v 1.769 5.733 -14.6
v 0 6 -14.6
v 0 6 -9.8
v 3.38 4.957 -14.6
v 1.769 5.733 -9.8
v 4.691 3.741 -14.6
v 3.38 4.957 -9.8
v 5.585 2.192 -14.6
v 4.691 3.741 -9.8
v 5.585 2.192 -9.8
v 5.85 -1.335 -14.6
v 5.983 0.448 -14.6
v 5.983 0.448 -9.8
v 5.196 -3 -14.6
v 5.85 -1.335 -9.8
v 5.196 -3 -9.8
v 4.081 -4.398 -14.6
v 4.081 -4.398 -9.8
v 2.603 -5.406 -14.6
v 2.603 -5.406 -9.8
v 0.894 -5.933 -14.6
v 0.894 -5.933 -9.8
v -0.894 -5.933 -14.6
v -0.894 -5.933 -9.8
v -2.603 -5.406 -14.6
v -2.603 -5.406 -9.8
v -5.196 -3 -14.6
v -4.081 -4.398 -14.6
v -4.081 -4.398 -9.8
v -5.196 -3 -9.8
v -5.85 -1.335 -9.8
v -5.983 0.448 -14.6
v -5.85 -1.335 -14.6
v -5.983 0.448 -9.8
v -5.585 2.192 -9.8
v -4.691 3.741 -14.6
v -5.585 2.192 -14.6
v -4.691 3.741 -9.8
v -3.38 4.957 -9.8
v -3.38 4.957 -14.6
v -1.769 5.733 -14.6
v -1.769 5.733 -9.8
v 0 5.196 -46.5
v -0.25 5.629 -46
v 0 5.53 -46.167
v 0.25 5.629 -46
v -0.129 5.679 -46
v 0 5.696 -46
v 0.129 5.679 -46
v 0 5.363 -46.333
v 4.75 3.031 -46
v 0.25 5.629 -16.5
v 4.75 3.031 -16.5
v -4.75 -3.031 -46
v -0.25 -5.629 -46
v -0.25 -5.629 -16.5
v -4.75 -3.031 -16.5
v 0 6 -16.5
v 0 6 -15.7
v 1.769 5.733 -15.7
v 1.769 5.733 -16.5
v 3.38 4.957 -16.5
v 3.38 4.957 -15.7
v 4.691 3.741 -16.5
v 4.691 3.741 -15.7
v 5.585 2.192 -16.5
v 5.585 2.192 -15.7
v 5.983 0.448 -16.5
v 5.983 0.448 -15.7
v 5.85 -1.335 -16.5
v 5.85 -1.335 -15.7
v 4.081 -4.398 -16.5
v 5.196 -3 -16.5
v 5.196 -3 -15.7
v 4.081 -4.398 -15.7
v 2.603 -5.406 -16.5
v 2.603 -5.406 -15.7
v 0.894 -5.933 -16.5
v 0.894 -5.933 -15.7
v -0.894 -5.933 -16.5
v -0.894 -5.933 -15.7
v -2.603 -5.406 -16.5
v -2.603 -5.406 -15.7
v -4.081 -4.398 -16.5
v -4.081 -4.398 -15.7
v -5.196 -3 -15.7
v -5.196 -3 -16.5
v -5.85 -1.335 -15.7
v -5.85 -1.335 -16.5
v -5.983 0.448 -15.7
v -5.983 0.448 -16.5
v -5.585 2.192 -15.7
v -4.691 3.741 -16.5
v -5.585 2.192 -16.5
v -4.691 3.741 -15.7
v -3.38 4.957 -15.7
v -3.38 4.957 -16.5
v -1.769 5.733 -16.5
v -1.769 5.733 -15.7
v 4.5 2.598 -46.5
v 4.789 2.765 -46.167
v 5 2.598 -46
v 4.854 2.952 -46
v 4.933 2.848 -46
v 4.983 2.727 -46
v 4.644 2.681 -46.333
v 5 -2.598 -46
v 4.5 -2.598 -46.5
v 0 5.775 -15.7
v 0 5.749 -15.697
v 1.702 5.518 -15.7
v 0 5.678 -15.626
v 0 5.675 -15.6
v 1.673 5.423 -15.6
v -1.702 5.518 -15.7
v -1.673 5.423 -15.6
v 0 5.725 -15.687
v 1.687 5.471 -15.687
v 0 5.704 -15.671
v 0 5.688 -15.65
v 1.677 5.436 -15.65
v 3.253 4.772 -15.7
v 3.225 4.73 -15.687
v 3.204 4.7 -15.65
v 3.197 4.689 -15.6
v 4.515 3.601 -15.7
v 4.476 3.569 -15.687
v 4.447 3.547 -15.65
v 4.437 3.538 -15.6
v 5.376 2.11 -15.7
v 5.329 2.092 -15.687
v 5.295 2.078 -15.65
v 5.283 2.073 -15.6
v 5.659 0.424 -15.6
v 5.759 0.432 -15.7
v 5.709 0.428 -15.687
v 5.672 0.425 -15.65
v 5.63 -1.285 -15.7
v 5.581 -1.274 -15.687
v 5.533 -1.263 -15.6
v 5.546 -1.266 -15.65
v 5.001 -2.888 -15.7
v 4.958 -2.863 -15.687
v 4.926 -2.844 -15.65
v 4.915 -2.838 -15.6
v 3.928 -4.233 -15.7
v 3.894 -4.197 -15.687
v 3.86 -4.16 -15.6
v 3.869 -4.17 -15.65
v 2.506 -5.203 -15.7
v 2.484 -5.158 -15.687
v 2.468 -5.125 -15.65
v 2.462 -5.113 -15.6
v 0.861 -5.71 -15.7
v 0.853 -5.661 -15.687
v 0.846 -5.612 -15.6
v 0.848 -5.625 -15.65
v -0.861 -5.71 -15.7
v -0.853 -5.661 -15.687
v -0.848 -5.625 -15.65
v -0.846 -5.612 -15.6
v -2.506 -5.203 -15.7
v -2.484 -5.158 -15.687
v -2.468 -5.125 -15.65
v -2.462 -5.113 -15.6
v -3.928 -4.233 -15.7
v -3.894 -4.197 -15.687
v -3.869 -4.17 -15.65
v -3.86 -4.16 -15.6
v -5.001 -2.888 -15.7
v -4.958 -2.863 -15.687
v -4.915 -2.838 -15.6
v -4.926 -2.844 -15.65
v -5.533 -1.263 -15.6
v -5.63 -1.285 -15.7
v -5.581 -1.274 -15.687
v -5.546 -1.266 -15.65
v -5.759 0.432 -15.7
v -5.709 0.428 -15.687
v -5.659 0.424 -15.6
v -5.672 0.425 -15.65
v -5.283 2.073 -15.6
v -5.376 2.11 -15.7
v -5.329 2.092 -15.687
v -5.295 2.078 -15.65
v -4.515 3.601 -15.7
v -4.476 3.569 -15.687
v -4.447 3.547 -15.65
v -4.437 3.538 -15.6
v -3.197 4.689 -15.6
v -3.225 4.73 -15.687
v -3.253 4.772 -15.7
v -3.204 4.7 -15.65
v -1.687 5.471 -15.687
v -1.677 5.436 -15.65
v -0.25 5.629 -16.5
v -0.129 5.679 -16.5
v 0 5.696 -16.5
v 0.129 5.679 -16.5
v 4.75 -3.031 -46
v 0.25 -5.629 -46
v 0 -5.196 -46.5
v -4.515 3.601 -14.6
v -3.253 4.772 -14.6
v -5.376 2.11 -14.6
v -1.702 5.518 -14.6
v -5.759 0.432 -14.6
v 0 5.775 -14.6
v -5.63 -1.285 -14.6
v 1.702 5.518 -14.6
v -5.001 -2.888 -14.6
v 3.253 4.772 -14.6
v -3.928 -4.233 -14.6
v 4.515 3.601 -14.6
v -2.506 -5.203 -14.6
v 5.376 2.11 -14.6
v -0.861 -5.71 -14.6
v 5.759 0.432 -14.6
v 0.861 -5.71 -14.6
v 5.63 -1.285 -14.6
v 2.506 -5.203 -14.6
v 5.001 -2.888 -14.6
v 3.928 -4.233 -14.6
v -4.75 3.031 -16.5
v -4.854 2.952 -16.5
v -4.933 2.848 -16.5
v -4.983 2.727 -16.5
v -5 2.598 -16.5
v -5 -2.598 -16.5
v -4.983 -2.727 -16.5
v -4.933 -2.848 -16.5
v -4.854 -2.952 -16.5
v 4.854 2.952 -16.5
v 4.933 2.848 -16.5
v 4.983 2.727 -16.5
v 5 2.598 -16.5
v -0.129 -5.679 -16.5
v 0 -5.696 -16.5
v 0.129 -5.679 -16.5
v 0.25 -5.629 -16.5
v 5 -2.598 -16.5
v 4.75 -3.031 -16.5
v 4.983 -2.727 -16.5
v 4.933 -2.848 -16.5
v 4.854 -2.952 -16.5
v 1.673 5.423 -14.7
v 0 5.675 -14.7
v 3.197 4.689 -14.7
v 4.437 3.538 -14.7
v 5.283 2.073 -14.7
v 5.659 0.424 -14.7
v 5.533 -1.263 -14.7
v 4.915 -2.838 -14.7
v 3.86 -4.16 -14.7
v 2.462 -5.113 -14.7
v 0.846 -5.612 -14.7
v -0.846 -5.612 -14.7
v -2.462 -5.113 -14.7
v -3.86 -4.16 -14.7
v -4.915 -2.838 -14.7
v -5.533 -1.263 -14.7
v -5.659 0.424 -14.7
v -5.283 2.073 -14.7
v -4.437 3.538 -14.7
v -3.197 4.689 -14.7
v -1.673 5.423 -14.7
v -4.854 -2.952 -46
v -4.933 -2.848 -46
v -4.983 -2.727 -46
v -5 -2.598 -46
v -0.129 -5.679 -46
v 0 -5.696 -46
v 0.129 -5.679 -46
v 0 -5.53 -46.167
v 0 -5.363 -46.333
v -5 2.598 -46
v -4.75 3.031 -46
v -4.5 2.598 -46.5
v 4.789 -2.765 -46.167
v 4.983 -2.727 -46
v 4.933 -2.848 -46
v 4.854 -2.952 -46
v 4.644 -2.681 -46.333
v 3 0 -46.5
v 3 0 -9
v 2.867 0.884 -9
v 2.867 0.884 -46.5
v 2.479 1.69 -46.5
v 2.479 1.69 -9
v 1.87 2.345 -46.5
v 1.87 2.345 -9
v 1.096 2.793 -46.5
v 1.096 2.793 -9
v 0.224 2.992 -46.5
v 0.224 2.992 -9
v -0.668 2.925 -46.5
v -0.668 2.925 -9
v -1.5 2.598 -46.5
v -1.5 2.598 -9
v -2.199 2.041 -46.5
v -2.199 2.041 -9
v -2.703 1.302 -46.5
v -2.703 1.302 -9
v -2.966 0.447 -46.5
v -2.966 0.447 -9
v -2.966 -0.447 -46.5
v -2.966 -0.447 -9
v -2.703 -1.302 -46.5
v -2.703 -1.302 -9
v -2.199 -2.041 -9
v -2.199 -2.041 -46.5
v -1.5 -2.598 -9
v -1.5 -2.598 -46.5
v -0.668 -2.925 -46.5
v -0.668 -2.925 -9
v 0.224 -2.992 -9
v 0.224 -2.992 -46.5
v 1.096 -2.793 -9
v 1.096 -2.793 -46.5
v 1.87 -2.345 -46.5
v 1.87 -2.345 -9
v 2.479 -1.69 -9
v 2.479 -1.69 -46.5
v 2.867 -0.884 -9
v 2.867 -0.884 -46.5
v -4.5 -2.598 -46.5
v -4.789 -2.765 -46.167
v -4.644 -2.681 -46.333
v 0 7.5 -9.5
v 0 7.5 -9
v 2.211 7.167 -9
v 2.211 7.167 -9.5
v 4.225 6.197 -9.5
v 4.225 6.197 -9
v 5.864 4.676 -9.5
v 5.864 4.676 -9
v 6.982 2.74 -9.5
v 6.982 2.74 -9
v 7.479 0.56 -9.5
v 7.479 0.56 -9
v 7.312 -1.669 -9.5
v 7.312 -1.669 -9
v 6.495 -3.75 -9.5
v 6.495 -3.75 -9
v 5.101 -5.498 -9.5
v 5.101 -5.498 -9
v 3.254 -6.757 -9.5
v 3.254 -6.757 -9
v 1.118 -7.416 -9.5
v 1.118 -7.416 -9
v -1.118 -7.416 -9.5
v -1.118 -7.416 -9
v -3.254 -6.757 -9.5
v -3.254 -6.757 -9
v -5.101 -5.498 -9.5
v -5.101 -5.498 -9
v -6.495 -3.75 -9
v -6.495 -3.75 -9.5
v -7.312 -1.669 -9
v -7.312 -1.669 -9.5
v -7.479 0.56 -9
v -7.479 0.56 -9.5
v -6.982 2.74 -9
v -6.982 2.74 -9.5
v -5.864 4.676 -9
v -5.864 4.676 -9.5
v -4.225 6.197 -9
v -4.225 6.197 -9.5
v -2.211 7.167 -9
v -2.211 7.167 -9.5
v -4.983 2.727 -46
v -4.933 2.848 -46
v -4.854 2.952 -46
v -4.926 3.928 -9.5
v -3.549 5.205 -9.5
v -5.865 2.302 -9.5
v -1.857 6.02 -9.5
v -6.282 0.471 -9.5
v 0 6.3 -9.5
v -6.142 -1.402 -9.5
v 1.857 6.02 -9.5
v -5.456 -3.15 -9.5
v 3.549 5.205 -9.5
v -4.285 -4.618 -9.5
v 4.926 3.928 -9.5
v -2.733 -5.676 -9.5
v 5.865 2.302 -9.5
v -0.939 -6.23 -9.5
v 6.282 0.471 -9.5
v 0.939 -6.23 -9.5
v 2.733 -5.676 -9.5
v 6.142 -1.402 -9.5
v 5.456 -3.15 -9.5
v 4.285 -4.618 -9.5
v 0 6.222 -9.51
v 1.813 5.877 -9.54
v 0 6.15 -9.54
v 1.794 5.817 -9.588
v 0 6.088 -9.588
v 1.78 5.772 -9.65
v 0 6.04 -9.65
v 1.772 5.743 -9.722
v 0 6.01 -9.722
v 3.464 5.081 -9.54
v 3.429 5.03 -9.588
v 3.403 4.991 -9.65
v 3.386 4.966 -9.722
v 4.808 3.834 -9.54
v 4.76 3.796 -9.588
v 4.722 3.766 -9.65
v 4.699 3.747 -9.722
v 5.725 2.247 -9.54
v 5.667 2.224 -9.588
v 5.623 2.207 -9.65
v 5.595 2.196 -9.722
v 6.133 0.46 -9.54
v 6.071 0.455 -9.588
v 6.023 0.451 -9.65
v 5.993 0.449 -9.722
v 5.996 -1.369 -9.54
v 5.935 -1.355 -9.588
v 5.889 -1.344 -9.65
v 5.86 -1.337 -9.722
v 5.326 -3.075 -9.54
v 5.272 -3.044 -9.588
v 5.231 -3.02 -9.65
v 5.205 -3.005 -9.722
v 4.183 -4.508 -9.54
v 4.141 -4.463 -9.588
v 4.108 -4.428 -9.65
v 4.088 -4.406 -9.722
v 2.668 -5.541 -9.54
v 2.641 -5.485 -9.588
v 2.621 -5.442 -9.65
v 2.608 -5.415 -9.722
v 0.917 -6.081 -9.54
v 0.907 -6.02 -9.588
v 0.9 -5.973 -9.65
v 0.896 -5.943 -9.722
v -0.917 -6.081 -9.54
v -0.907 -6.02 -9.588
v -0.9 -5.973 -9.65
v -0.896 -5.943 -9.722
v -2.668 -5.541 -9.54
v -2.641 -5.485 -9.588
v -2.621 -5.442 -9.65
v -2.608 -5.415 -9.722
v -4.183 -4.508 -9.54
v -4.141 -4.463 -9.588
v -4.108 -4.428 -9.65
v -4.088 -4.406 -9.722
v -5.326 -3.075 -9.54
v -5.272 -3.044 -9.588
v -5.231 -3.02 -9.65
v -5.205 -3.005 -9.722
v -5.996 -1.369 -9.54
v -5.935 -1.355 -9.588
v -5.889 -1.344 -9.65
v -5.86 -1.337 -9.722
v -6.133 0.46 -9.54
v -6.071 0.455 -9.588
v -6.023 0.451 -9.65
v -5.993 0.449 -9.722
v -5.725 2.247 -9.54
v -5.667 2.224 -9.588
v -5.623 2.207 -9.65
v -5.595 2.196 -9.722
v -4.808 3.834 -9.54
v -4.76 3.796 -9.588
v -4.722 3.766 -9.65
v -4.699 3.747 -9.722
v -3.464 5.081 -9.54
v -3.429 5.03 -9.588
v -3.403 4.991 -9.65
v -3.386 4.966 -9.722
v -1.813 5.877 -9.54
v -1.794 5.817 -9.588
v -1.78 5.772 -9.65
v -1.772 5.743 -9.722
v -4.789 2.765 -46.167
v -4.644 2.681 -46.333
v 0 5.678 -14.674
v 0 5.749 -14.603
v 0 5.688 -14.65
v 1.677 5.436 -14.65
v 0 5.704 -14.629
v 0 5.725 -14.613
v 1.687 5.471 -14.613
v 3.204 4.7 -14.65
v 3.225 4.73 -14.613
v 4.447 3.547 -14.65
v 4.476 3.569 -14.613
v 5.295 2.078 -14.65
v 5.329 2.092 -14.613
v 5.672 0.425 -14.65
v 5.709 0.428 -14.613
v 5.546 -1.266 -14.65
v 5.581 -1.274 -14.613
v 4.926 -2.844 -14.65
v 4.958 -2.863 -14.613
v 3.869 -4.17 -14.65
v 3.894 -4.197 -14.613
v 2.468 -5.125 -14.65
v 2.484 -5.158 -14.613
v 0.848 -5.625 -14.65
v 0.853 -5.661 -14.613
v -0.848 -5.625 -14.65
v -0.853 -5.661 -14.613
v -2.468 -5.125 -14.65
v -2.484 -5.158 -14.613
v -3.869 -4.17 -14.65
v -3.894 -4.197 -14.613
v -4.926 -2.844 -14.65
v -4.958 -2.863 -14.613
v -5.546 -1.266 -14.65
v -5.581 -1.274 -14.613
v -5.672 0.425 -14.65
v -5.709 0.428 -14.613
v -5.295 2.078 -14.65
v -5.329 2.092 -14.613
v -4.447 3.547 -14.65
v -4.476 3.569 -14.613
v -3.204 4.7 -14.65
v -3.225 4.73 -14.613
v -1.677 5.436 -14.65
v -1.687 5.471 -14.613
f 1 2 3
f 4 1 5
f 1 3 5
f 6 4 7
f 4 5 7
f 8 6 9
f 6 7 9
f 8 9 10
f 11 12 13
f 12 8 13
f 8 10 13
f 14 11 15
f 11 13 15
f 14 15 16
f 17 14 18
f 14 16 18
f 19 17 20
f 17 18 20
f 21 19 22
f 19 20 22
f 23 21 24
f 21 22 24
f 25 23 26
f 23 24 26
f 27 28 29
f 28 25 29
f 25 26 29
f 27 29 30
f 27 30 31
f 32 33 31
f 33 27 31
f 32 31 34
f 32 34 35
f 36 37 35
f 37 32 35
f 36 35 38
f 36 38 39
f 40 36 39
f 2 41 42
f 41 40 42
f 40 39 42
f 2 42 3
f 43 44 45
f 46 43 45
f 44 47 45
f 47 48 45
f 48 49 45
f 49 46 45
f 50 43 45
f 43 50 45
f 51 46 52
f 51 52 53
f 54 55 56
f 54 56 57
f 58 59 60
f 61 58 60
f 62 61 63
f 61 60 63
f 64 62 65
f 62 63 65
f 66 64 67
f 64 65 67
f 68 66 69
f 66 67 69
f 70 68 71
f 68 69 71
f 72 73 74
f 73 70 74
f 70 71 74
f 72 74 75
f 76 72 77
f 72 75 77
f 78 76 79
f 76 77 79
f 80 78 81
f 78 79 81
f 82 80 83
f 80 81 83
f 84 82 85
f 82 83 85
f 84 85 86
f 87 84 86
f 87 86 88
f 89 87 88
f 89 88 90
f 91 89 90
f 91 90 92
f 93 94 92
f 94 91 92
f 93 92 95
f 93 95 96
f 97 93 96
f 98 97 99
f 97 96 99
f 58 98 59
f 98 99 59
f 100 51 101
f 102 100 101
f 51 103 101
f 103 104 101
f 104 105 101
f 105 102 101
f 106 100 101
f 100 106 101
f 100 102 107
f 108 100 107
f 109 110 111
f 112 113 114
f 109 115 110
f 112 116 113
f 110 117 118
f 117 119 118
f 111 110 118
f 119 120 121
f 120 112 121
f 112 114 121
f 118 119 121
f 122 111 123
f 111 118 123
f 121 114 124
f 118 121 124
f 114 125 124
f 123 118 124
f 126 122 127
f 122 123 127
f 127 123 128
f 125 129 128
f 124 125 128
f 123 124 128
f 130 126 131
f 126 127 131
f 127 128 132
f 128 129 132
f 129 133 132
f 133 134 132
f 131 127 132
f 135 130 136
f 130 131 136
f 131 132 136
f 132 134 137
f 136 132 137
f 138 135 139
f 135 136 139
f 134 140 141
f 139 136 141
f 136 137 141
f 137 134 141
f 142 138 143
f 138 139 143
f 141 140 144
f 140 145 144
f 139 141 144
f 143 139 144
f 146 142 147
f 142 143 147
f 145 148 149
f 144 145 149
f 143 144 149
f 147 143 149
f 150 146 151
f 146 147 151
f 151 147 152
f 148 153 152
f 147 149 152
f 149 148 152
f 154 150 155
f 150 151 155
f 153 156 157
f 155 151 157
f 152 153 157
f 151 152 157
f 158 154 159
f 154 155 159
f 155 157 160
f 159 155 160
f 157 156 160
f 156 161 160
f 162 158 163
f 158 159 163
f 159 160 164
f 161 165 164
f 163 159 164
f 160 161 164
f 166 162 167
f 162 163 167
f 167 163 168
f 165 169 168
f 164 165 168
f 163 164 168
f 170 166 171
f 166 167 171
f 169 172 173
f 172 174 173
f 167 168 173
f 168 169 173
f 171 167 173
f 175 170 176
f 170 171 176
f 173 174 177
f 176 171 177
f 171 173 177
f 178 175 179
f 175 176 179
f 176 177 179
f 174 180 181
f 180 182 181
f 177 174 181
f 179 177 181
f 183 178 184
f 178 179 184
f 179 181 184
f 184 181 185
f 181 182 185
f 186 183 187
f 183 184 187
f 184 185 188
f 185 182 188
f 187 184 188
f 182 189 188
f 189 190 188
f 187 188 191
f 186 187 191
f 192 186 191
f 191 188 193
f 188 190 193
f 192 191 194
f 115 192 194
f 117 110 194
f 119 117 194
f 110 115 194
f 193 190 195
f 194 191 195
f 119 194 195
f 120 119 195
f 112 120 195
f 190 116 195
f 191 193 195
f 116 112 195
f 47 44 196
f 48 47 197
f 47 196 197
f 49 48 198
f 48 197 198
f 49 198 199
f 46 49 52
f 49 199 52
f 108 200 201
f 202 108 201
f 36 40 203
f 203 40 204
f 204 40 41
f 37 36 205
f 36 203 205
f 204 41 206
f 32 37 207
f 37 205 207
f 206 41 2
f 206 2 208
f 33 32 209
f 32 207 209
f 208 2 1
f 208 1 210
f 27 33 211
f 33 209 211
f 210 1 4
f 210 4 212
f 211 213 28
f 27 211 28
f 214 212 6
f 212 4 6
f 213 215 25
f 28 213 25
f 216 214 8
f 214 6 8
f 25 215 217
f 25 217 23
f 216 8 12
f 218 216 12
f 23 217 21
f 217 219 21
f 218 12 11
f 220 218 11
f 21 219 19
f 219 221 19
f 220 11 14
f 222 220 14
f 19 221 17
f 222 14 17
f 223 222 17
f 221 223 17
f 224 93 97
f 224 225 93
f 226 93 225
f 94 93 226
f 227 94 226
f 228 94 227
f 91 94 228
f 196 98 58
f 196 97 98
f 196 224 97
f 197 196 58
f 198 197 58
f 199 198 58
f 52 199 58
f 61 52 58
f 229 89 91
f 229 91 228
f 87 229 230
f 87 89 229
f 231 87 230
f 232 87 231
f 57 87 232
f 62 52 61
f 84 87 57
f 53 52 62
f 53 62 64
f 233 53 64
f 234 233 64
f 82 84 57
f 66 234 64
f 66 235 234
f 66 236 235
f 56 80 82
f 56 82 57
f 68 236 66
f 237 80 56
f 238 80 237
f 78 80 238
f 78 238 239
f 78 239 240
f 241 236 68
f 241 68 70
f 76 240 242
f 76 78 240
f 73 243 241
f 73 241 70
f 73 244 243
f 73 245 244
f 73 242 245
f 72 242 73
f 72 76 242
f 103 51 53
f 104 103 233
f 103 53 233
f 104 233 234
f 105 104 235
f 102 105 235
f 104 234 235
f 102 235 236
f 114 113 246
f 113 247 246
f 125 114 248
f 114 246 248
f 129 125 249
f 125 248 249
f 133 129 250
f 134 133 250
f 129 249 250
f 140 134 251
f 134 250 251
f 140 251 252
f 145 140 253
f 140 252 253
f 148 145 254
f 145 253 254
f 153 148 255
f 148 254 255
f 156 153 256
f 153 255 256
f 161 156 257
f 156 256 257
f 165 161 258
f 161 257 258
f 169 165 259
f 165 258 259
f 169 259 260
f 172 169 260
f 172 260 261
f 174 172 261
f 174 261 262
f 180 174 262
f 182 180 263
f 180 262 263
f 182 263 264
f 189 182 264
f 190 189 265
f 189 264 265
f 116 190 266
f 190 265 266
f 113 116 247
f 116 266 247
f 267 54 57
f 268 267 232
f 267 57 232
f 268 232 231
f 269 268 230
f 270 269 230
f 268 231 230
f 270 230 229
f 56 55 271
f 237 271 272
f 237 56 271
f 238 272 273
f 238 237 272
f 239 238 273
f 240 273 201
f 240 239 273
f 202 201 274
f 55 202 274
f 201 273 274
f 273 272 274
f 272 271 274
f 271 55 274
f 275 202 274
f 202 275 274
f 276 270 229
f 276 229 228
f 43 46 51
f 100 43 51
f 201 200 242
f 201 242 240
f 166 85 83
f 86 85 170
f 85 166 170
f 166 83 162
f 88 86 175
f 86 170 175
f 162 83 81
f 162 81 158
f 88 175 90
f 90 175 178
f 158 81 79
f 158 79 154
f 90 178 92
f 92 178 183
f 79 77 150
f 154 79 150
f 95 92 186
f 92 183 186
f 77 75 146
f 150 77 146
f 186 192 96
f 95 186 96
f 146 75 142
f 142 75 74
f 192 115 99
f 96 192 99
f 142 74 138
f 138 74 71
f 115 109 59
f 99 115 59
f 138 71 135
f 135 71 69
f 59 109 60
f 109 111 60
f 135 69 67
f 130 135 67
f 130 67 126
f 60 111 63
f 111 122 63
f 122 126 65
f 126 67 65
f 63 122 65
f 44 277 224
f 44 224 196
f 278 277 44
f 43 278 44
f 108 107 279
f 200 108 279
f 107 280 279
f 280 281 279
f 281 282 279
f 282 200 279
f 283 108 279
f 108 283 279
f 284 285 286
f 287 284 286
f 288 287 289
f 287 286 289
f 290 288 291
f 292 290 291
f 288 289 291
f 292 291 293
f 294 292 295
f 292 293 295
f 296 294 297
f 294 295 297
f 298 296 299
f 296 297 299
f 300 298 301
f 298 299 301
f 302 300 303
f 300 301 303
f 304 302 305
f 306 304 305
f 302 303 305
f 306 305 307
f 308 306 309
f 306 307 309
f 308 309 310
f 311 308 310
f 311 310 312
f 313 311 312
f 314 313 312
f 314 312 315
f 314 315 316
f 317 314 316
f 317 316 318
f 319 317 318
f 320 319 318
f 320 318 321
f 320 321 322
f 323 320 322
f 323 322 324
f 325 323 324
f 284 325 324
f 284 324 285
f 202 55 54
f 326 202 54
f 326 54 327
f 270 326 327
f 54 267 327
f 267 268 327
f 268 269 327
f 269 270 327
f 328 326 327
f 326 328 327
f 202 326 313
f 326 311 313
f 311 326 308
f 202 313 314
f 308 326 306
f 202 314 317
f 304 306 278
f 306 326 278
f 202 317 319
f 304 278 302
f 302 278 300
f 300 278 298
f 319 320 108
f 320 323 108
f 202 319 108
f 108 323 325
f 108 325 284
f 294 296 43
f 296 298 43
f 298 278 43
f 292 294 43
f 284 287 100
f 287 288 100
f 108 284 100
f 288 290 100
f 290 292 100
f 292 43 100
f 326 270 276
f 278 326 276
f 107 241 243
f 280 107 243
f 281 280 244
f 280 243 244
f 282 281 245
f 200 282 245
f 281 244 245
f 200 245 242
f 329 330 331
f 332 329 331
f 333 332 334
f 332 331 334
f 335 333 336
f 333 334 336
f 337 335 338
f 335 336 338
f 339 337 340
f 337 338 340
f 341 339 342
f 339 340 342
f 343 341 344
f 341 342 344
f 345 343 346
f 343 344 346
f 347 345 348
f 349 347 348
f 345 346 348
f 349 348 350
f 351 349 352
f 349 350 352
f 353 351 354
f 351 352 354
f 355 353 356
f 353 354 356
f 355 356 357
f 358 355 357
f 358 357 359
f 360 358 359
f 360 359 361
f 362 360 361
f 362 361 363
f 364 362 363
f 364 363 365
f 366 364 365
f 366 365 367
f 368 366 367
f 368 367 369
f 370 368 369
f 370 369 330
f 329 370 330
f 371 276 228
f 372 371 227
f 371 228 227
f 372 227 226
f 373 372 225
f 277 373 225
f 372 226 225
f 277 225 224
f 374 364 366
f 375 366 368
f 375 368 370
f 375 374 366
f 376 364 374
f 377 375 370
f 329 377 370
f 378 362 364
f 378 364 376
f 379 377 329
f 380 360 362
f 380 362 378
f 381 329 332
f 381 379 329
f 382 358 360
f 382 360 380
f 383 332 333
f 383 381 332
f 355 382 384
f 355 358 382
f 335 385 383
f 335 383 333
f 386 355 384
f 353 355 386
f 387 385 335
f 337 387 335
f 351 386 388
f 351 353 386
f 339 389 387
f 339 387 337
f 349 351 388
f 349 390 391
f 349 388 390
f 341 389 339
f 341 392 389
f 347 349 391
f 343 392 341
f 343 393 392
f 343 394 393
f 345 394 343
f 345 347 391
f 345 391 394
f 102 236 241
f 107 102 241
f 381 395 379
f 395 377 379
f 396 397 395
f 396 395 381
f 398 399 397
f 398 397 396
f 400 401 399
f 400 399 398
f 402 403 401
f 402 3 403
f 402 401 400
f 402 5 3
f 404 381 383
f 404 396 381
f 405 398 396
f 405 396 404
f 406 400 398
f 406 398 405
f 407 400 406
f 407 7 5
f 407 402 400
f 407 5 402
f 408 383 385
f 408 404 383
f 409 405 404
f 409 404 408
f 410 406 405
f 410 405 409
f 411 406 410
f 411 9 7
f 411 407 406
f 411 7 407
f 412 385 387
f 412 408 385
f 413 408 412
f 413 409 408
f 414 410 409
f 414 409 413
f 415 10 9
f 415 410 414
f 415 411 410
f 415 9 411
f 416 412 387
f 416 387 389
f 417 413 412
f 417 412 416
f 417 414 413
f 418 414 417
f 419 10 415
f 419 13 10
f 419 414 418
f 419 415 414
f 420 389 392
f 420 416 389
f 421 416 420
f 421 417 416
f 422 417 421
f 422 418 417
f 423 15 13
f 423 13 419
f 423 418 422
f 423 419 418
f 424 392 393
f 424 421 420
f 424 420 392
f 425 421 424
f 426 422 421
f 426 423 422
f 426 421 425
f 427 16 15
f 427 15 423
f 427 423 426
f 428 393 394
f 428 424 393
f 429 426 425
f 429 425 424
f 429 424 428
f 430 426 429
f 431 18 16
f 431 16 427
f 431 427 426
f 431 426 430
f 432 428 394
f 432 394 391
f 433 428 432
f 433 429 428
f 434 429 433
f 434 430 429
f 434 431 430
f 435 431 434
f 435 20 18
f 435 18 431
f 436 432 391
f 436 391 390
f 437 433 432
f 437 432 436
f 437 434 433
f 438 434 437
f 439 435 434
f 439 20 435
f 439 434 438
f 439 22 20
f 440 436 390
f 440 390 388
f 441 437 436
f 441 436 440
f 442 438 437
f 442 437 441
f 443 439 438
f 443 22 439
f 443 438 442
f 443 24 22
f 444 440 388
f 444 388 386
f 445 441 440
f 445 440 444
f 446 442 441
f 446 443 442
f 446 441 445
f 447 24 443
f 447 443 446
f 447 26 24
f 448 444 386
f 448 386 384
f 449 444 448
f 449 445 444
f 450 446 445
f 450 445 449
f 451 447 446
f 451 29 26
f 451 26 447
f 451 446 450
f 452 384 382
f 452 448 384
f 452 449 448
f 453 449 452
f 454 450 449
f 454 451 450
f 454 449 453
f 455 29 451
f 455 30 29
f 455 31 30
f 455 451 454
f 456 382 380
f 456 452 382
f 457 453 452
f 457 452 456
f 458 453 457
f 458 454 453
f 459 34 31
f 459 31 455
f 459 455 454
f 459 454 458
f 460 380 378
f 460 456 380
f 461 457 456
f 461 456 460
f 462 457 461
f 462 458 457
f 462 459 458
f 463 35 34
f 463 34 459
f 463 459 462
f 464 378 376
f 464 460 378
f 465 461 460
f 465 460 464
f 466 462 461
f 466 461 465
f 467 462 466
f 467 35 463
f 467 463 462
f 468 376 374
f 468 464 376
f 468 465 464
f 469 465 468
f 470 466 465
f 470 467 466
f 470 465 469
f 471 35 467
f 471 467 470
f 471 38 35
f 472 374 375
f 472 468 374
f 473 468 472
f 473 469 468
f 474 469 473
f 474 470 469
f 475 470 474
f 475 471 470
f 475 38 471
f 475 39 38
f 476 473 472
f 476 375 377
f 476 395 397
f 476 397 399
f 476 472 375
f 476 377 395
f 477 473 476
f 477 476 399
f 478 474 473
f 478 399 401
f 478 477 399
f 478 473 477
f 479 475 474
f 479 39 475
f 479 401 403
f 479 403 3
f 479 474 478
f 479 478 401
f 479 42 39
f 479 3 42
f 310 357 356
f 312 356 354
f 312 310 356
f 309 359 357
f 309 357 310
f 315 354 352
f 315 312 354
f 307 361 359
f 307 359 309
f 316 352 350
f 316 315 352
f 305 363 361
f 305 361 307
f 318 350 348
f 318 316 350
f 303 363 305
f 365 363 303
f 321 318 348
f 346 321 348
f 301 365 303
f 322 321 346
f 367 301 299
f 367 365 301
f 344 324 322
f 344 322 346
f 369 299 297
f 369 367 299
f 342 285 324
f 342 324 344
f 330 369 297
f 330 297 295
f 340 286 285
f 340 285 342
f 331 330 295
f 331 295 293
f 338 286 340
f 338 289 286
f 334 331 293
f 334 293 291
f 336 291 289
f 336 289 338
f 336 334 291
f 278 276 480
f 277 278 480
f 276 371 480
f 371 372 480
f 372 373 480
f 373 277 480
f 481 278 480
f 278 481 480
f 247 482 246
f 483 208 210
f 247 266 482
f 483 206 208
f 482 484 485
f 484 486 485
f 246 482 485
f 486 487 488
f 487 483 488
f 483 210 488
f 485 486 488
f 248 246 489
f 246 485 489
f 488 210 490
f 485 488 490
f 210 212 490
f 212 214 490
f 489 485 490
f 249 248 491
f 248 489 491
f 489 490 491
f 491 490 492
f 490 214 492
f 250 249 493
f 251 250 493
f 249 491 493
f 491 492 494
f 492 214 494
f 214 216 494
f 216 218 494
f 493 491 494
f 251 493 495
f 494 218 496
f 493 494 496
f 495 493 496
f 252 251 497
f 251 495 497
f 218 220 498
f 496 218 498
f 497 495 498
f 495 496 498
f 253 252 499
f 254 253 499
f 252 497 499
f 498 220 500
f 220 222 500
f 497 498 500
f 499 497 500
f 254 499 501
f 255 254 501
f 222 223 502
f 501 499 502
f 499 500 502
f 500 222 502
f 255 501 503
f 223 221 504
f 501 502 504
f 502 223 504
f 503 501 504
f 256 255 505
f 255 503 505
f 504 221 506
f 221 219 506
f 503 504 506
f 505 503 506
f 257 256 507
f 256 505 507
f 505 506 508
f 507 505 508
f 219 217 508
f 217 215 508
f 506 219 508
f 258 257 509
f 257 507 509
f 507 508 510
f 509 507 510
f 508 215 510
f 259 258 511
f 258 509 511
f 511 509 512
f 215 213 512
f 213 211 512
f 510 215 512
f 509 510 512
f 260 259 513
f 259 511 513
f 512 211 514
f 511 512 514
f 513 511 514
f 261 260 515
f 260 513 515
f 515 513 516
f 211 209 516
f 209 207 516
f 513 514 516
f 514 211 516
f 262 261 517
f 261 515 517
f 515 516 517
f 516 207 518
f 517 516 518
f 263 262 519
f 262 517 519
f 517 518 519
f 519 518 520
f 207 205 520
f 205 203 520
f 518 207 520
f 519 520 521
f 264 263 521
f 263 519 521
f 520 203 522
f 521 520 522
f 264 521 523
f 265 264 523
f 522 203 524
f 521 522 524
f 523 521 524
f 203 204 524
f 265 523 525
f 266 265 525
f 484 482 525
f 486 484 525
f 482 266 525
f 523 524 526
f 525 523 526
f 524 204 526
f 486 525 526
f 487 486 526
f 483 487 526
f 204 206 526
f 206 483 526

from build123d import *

# Parameters (mm, degrees)
SKETCH1_R             = 10.5
SKETCH1_R_2           = 3
EXTRUDE1_DEPTH        = 46.5
SKETCH1_3_R           = 3
CUT_EXTRUDE1_DEPTH    = 49.813420286
CUT_EXTRUDE4_DEPTH    = 8.5
CUT_EXTRUDE6_START    = -37
SKETCH6_R             = 10.5
SKETCH6_R_2           = 6
CUT_EXTRUDE6_DEPTH    = 37
CUT_EXTRUDE7_START    = -1
SKETCH7_R             = 10.5
SKETCH7_R_2           = 7.5
CUT_EXTRUDE7_DEPTH    = 1
M4X0_7_TAPPED_HOLE1_D = 3
SKETCH8_OUTSIDE_W     = 33.82
SKETCH8_OUTSIDE_H     = 30.82
CUT_EXTRUDE8_DEPTH    = 30
FILLET1_R             = 0.5
CHAMFER1_SIZE         = 0.5
FILLET2_R             = 0.3
CHAMFER2_SIZE         = 1
SKETCH13_R            = 14.541098745
CUT_EXTRUDE9_DEPTH    = 9


with BuildPart() as part:
    # Sketch1 → Extrude1 (new body)
    # profile 1 of 2: a face of its own
    with BuildSketch(Plane.XY):
        Circle(SKETCH1_R)
        Circle(SKETCH1_R_2, mode=Mode.SUBTRACT)
    # profile 2 of 2: a face of its own
    with BuildSketch(Plane.XY):
        Circle(SKETCH1_R_2)
    extrude(amount=-EXTRUDE1_DEPTH)

    # Sketch1<3> → Cut-Extrude1 (cut, through all)
    with BuildSketch(Plane.XY):
        Circle(SKETCH1_3_R)
    extrude(amount=-CUT_EXTRUDE1_DEPTH, mode=Mode.SUBTRACT)

    # Sketch4 → Cut-Extrude4 (cut)
    with BuildSketch(Plane.XY):
        with BuildLine():
            Line((-10.24499878, 2.3), (10.24499878, 2.3))
            ThreePointArc((10.24499878, 2.3), (0, 10.5), (-10.24499878, 2.3))
        make_face()
    extrude(amount=-CUT_EXTRUDE4_DEPTH, mode=Mode.SUBTRACT)

    # Sketch6 → Cut-Extrude6 (cut)
    with BuildSketch(Plane(origin=(0, 0, -46.5), x_dir=(1, 0, 0), z_dir=(0, 0, -1)).offset(CUT_EXTRUDE6_START)):
        Circle(SKETCH6_R)
        with Locations(Location((0, 0, 0), (0, 0, 270))):
            Circle(SKETCH6_R_2, mode=Mode.SUBTRACT)
    extrude(amount=CUT_EXTRUDE6_DEPTH, mode=Mode.SUBTRACT)

    # Sketch7 → Cut-Extrude7 (cut)
    with BuildSketch(Plane(origin=(0, 0, -9.5), x_dir=(1, 0, 0), z_dir=(0, 0, -1)).offset(CUT_EXTRUDE7_START)):
        Circle(SKETCH7_R)
        with Locations(Location((0, 0, 0), (0, 0, 270))):
            Circle(SKETCH7_R_2, mode=Mode.SUBTRACT)
    extrude(amount=CUT_EXTRUDE7_DEPTH, mode=Mode.SUBTRACT)

    # M4x0.7 Tapped Hole1 (through all)
    with Locations(Plane(origin=(6.25, 2.3, -4.25), x_dir=(0, 0, 1), z_dir=(0, 1, 0))):
        with Locations((0, 0), (0, -12.5)):
            Hole(M4X0_7_TAPPED_HOLE1_D / 2)

    # Sketch8 outside → Cut-Extrude8 (cut)
    with BuildSketch(Plane(origin=(0, 0, -46.5), x_dir=(1, 0, 0), z_dir=(0, 0, -1))):
        with Locations((0, 1.5)):
            Rectangle(SKETCH8_OUTSIDE_W, SKETCH8_OUTSIDE_H)
        Polygon((0, 5.773502692), (-5, 2.886751346), (-5, -2.886751346), (0, -5.773502692), (5, -2.886751346), (5, 2.886751346), align=None, mode=Mode.SUBTRACT)
    extrude(amount=-CUT_EXTRUDE8_DEPTH, mode=Mode.SUBTRACT)

    # Fillet1
    fillet1_edges = [part.edges().sort_by_distance(p)[0] for p in [
        (5, -2.886751346, -31.5),
        (5, 2.886751346, -31.5),
        (0, 5.773502692, -31.5),
        (-5, 2.886751346, -31.5),
        (-5, -2.886751346, -31.5),
        (0, -5.773502692, -31.5),
    ]]
    fillet(fillet1_edges, radius=FILLET1_R)

    # Chamfer1
    chamfer1_edges = [part.edges().sort_by_distance(p)[0] for p in [
        (-2.5, -4.330127019, -46.5),
        (2.5, -4.330127019, -46.5),
        (-5, 0, -46.5),
        (-2.5, 4.330127019, -46.5),
        (2.5, 4.330127019, -46.5),
        (5, 0, -46.5),
        (0, -5.696152423, -46.5),
        (4.933012702, -2.848076211, -46.5),
        (4.933012702, 2.848076211, -46.5),
        (0, 5.696152423, -46.5),
        (-4.933012702, 2.848076211, -46.5),
        (-4.933012702, -2.848076211, -46.5),
    ]]
    chamfer(chamfer1_edges, length=CHAMFER1_SIZE - 0.0001)  # a hair under: the kernel refuses the full size

    # Sketch12 → Groove for ANSI B27.7 - 3AM1-12, Basic External Retaining Ring1 (revolve, cut)
    with BuildSketch(Plane(origin=(0, 0, 19.370057685), x_dir=(0, 1, 0), z_dir=(-1, 0, 0))):
        with BuildLine():
            Line((5.775, 33.970057685), (7.275, 33.970057685))
            Line((7.275, 33.970057685), (7.275, 35.070057685))
            Line((7.275, 35.070057685), (5.775, 35.070057685))
            ThreePointArc((5.775, 35.070057685), (5.704289322, 35.040768363), (5.675, 34.970057685))
            Line((5.675, 34.970057685), (5.675, 34.070057685))
            ThreePointArc((5.675, 34.070057685), (5.704289322, 33.999347007), (5.775, 33.970057685))
        make_face()
    revolve(axis=Axis((0, 0, 69.359173663), (0, 0, -1)), mode=Mode.SUBTRACT)

    # Fillet2
    fillet2_edges = [part.edges().sort_by_distance(p)[0] for p in [
        (0, -6, -9.5),
        (0, -7.5, -8.5),
    ]]
    fillet(fillet2_edges, radius=FILLET2_R)

    # Chamfer2
    chamfer2_edges = [part.edges().sort_by_distance(p)[0] for p in [
        (0, -10.5, 0),
        (0, -10.5, -8.5),
    ]]
    chamfer(chamfer2_edges, length=CHAMFER2_SIZE)

    # Sketch13 → Cut-Extrude9 (cut)
    with BuildSketch(Plane.XY):
        Circle(SKETCH13_R)
    extrude(amount=-CUT_EXTRUDE9_DEPTH, mode=Mode.SUBTRACT)


solid = part.part
